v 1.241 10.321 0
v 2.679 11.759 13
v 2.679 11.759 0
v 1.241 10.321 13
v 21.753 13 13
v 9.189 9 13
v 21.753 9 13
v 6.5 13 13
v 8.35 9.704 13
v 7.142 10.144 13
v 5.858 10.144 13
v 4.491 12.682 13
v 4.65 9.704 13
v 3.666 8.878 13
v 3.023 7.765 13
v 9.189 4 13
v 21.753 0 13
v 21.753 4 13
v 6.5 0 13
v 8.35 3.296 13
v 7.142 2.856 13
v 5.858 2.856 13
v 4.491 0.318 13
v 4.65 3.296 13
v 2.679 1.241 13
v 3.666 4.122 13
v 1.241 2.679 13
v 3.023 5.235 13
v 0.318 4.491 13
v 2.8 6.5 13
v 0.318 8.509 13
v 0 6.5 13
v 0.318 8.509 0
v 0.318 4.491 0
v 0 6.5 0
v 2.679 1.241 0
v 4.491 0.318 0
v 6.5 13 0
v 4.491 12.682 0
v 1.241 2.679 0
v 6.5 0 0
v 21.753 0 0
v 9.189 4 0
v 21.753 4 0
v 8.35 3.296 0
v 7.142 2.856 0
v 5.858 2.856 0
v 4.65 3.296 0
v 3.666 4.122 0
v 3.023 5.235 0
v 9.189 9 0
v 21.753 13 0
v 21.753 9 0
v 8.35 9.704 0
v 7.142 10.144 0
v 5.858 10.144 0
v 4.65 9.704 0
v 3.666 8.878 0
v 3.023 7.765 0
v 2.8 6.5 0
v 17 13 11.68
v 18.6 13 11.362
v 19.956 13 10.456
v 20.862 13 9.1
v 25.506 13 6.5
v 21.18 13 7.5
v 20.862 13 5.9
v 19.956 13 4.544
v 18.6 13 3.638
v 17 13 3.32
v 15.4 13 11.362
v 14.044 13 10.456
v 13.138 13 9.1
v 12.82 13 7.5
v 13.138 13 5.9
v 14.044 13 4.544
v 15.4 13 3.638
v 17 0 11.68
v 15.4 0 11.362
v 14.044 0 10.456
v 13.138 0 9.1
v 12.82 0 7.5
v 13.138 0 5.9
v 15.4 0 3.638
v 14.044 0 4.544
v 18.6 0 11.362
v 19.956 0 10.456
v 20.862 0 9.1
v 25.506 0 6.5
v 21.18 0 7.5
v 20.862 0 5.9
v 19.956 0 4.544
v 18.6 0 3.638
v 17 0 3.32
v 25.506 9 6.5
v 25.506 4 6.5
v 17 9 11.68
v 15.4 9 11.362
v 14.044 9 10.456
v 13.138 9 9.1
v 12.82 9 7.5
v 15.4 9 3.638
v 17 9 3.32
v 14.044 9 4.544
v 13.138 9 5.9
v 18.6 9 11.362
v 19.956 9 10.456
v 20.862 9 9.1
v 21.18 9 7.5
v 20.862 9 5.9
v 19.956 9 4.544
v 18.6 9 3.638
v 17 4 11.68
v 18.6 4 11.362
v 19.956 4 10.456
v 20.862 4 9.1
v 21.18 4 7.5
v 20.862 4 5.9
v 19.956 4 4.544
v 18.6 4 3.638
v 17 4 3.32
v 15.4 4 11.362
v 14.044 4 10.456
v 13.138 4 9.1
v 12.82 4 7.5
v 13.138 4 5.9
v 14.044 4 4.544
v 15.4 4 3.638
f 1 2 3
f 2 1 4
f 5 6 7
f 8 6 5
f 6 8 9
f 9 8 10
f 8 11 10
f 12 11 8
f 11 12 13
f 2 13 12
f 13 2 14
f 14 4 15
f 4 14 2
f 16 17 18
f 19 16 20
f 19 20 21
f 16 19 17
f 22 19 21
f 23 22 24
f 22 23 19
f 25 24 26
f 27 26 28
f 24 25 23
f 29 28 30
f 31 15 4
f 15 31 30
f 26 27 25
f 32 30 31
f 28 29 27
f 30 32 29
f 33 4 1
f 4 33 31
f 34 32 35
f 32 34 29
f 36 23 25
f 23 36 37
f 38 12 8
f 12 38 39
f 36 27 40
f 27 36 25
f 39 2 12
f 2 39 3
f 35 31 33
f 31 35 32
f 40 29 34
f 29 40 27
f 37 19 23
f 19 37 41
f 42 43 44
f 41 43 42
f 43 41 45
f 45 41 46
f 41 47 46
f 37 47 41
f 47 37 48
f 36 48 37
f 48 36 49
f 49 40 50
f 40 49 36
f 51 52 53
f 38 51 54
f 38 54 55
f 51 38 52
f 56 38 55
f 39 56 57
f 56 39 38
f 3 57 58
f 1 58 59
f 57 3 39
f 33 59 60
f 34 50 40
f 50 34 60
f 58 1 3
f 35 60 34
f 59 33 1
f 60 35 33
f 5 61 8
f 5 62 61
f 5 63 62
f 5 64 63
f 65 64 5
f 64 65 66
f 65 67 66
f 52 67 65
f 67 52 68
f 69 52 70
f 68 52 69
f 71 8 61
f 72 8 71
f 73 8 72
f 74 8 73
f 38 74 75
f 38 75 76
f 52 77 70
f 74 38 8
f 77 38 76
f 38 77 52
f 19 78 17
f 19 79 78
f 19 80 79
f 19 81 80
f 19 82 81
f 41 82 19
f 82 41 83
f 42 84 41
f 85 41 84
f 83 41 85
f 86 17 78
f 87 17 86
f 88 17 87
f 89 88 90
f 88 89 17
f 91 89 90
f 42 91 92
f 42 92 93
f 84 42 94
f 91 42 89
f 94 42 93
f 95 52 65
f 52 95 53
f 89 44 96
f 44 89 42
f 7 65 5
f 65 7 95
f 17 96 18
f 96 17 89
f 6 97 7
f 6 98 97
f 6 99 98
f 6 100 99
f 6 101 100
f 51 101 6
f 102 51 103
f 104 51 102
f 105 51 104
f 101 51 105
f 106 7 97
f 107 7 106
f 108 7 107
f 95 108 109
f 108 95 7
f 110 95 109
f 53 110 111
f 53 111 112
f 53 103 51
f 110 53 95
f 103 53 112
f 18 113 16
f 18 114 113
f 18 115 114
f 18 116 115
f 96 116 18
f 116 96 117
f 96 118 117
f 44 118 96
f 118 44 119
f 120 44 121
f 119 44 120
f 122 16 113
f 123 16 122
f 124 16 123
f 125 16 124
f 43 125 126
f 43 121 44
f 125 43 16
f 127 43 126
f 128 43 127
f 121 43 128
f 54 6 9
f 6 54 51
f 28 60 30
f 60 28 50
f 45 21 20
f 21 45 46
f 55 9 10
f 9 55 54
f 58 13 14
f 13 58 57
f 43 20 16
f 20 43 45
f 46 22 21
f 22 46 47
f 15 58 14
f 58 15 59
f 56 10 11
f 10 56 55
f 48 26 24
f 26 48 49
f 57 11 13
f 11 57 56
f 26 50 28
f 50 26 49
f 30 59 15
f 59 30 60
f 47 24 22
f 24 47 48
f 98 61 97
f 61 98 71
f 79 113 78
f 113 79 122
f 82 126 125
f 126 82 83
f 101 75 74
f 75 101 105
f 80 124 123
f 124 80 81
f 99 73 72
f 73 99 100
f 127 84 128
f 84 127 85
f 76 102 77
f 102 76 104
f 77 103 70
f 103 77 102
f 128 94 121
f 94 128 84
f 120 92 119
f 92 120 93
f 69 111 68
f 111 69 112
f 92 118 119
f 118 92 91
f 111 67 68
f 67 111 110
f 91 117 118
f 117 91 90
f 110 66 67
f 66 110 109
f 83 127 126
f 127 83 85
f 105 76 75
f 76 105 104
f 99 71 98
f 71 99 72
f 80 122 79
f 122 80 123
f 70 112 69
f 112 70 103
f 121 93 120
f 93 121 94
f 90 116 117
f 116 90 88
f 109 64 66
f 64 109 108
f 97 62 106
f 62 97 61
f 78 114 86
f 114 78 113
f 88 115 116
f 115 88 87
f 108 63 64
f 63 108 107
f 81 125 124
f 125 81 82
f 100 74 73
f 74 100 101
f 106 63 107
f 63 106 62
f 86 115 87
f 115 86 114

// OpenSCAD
// file: functions.scad
// PRUSA Mendel  
// Functions used in many files
// GNU GPL v3
// Josef Průša
// josefprusa@me.com
// prusadjs.cz
// http://www.reprap.org/wiki/Prusa_Mendel
// http://github.com/prusajr/PrusaMendel


module nut(d,h,horizontal=true) {
	cornerdiameter = (d / 2) / cos (180 / 6);
	cylinder(h = h, r = cornerdiameter, $fn = 6);
	if(horizontal) {
		for(i = [1:6]) {
			rotate([0,0,60*i]) translate([-cornerdiameter-0.2,0,0]) rotate([0,0,-45]) cube(size = [2,2,h]);
		}
	}
}

// Based on nophead research
module polyhole(d,h) {
	n = max(round(2 * d),3);
	rotate([0,0,180])
		cylinder(h = h, r = (d / 2) / cos (180 / n), $fn = n);
}

module roundcorner(diameter) {
	difference() {
		cube(size = [diameter,diameter,99], center = false);
		translate(v = [diameter, diameter, 0]) cylinder(h = 100, r=diameter, center=true);
	}
}
// file: metric.scad
// PRUSA Mendel  
// Default metric sizes
// GNU GPL v2
// Josef Průša
// josefprusa@me.com
// prusadjs.cz
// http://www.reprap.org/wiki/Prusa_Mendel
// http://github.com/prusajr/PrusaMendel

// DONT CHANGE THIS FILE! ALTER VALUES IN CONFIGURATION.SCAD INSTEAD

// RODS

threaded_rod_diameter = 8.2;
threaded_rod_diameter_horizontal = 8.2;
smooth_bar_diameter = 8;
smooth_bar_diameter_horizontal = 8.5;

// Nuts and bolts
// Nut diameters are flat to flat

m8_diameter = 9;
m8_nut_diameter = 16.4;
m8_nut_thickness = 6.5;

m4_diameter = 4.5;
m4_nut_diameter = 9;
m4_nut_thickness = 3.2;

m3_diameter = 3.6;
m3_nut_diameter = 6.1;
m3_nut_thickness = 2.4;

// Bushing holder

bushing_core_diameter = smooth_bar_diameter;
bushing_material_thickness = 1;

// Motors

motor_shaft = 5.5;
// file: configuration.scad
// PRUSA Mendel  
// Configuration file
// GNU GPL v3
// Josef Průša
// josefprusa@me.com
// prusadjs.cz
// http://www.reprap.org/wiki/Prusa_Mendel
// http://github.com/prusajr/PrusaMendel

// PLEASE SELECT ONE OF THE CONFIGURATIONS BELOW
// BY UN-COMMENTING IT

// Uncomment for metric settings
// METRIC METRIC METRIC METRIC METRIC METRIC METRIC METRIC 

include <metric.scad>;

// CUSTOM CUSTOM CUSTOM CUSTOM CUSTOM CUSTOM CUSTOM CUSTOM CUSTOM

thin_wall = 3;


// Linear bearing version
linear = true;
// set false for LM-8UU, true for LM-E-8UU (ignore if linear is set to false)
lme8uu = false;



// CHANGE ONLY THE STUFF YOU KNOW
// IT WILL REPLACE DEFAULT SETTING

// RODS

// threaded_rod_diameter = 0;
// threaded_rod_diameter_horizontal = 0;
// smooth_bar_diameter = 0;
// smooth_bar_diameter_horizontal = 0;

// Nuts and bolts

// m8_diameter = 0;
// m8_nut_diameter = 0;

// m4_diameter = 0;
// m4_nut_diameter = 0;

m3_diameter = 3; // polyholes need the exact measurement
// m3_nut_diameter = 0;

// Bushing holder

// bushing_core_diameter = smooth_bar_diameter;
// bushing_material_thickness = 0;


///counted stuff
m3_nut_diameter_bigger = ((m3_nut_diameter  / 2) / cos (180 / 6))*2;

// functions 
include <functions.scad>
// main file
// PRUSA Mendel  
// Bar clamp
// Used for joining 8mm rods
// GNU GPL v3
// Josef Průša
// josefprusa@me.com
// prusadjs.cz
// http://www.reprap.org/wiki/Prusa_Mendel
// http://github.com/prusajr/PrusaMendel

include <configuration.scad>

/**
 * @id bar-clamp
 * @name Bar clamp
 * @category Printed
 * @using 2 m8nut
 * @using 2 m8washer
 */ 

module barclamp(){
outer_diameter = (threaded_rod_diameter-0.0)/2+2.4;

difference(){
	union(){
		
		translate([outer_diameter, outer_diameter, 0]) 
			cylinder(h =outer_diameter*2, r = outer_diameter, $fn = 20);
		translate([outer_diameter, 0, 0]) cube([outer_diameter+1.5,outer_diameter*2,outer_diameter*2]);
		translate([18, 2*outer_diameter, outer_diameter]) 
			rotate([90, 0, 0]) rotate([00, 0, 0]) nut(outer_diameter*2,outer_diameter*2,false);
	}

	translate([18, outer_diameter, 9]) cube([18,05,20], center=true);
	translate([outer_diameter, outer_diameter, -1]) cylinder(h = 20, r = threaded_rod_diameter/2-0.4, $fn = 18);
	#translate([17, 17, 7.5]) rotate([90, 0, 0]) polyhole(h = 20, d = threaded_rod_diameter);
}
}
barclamp();
